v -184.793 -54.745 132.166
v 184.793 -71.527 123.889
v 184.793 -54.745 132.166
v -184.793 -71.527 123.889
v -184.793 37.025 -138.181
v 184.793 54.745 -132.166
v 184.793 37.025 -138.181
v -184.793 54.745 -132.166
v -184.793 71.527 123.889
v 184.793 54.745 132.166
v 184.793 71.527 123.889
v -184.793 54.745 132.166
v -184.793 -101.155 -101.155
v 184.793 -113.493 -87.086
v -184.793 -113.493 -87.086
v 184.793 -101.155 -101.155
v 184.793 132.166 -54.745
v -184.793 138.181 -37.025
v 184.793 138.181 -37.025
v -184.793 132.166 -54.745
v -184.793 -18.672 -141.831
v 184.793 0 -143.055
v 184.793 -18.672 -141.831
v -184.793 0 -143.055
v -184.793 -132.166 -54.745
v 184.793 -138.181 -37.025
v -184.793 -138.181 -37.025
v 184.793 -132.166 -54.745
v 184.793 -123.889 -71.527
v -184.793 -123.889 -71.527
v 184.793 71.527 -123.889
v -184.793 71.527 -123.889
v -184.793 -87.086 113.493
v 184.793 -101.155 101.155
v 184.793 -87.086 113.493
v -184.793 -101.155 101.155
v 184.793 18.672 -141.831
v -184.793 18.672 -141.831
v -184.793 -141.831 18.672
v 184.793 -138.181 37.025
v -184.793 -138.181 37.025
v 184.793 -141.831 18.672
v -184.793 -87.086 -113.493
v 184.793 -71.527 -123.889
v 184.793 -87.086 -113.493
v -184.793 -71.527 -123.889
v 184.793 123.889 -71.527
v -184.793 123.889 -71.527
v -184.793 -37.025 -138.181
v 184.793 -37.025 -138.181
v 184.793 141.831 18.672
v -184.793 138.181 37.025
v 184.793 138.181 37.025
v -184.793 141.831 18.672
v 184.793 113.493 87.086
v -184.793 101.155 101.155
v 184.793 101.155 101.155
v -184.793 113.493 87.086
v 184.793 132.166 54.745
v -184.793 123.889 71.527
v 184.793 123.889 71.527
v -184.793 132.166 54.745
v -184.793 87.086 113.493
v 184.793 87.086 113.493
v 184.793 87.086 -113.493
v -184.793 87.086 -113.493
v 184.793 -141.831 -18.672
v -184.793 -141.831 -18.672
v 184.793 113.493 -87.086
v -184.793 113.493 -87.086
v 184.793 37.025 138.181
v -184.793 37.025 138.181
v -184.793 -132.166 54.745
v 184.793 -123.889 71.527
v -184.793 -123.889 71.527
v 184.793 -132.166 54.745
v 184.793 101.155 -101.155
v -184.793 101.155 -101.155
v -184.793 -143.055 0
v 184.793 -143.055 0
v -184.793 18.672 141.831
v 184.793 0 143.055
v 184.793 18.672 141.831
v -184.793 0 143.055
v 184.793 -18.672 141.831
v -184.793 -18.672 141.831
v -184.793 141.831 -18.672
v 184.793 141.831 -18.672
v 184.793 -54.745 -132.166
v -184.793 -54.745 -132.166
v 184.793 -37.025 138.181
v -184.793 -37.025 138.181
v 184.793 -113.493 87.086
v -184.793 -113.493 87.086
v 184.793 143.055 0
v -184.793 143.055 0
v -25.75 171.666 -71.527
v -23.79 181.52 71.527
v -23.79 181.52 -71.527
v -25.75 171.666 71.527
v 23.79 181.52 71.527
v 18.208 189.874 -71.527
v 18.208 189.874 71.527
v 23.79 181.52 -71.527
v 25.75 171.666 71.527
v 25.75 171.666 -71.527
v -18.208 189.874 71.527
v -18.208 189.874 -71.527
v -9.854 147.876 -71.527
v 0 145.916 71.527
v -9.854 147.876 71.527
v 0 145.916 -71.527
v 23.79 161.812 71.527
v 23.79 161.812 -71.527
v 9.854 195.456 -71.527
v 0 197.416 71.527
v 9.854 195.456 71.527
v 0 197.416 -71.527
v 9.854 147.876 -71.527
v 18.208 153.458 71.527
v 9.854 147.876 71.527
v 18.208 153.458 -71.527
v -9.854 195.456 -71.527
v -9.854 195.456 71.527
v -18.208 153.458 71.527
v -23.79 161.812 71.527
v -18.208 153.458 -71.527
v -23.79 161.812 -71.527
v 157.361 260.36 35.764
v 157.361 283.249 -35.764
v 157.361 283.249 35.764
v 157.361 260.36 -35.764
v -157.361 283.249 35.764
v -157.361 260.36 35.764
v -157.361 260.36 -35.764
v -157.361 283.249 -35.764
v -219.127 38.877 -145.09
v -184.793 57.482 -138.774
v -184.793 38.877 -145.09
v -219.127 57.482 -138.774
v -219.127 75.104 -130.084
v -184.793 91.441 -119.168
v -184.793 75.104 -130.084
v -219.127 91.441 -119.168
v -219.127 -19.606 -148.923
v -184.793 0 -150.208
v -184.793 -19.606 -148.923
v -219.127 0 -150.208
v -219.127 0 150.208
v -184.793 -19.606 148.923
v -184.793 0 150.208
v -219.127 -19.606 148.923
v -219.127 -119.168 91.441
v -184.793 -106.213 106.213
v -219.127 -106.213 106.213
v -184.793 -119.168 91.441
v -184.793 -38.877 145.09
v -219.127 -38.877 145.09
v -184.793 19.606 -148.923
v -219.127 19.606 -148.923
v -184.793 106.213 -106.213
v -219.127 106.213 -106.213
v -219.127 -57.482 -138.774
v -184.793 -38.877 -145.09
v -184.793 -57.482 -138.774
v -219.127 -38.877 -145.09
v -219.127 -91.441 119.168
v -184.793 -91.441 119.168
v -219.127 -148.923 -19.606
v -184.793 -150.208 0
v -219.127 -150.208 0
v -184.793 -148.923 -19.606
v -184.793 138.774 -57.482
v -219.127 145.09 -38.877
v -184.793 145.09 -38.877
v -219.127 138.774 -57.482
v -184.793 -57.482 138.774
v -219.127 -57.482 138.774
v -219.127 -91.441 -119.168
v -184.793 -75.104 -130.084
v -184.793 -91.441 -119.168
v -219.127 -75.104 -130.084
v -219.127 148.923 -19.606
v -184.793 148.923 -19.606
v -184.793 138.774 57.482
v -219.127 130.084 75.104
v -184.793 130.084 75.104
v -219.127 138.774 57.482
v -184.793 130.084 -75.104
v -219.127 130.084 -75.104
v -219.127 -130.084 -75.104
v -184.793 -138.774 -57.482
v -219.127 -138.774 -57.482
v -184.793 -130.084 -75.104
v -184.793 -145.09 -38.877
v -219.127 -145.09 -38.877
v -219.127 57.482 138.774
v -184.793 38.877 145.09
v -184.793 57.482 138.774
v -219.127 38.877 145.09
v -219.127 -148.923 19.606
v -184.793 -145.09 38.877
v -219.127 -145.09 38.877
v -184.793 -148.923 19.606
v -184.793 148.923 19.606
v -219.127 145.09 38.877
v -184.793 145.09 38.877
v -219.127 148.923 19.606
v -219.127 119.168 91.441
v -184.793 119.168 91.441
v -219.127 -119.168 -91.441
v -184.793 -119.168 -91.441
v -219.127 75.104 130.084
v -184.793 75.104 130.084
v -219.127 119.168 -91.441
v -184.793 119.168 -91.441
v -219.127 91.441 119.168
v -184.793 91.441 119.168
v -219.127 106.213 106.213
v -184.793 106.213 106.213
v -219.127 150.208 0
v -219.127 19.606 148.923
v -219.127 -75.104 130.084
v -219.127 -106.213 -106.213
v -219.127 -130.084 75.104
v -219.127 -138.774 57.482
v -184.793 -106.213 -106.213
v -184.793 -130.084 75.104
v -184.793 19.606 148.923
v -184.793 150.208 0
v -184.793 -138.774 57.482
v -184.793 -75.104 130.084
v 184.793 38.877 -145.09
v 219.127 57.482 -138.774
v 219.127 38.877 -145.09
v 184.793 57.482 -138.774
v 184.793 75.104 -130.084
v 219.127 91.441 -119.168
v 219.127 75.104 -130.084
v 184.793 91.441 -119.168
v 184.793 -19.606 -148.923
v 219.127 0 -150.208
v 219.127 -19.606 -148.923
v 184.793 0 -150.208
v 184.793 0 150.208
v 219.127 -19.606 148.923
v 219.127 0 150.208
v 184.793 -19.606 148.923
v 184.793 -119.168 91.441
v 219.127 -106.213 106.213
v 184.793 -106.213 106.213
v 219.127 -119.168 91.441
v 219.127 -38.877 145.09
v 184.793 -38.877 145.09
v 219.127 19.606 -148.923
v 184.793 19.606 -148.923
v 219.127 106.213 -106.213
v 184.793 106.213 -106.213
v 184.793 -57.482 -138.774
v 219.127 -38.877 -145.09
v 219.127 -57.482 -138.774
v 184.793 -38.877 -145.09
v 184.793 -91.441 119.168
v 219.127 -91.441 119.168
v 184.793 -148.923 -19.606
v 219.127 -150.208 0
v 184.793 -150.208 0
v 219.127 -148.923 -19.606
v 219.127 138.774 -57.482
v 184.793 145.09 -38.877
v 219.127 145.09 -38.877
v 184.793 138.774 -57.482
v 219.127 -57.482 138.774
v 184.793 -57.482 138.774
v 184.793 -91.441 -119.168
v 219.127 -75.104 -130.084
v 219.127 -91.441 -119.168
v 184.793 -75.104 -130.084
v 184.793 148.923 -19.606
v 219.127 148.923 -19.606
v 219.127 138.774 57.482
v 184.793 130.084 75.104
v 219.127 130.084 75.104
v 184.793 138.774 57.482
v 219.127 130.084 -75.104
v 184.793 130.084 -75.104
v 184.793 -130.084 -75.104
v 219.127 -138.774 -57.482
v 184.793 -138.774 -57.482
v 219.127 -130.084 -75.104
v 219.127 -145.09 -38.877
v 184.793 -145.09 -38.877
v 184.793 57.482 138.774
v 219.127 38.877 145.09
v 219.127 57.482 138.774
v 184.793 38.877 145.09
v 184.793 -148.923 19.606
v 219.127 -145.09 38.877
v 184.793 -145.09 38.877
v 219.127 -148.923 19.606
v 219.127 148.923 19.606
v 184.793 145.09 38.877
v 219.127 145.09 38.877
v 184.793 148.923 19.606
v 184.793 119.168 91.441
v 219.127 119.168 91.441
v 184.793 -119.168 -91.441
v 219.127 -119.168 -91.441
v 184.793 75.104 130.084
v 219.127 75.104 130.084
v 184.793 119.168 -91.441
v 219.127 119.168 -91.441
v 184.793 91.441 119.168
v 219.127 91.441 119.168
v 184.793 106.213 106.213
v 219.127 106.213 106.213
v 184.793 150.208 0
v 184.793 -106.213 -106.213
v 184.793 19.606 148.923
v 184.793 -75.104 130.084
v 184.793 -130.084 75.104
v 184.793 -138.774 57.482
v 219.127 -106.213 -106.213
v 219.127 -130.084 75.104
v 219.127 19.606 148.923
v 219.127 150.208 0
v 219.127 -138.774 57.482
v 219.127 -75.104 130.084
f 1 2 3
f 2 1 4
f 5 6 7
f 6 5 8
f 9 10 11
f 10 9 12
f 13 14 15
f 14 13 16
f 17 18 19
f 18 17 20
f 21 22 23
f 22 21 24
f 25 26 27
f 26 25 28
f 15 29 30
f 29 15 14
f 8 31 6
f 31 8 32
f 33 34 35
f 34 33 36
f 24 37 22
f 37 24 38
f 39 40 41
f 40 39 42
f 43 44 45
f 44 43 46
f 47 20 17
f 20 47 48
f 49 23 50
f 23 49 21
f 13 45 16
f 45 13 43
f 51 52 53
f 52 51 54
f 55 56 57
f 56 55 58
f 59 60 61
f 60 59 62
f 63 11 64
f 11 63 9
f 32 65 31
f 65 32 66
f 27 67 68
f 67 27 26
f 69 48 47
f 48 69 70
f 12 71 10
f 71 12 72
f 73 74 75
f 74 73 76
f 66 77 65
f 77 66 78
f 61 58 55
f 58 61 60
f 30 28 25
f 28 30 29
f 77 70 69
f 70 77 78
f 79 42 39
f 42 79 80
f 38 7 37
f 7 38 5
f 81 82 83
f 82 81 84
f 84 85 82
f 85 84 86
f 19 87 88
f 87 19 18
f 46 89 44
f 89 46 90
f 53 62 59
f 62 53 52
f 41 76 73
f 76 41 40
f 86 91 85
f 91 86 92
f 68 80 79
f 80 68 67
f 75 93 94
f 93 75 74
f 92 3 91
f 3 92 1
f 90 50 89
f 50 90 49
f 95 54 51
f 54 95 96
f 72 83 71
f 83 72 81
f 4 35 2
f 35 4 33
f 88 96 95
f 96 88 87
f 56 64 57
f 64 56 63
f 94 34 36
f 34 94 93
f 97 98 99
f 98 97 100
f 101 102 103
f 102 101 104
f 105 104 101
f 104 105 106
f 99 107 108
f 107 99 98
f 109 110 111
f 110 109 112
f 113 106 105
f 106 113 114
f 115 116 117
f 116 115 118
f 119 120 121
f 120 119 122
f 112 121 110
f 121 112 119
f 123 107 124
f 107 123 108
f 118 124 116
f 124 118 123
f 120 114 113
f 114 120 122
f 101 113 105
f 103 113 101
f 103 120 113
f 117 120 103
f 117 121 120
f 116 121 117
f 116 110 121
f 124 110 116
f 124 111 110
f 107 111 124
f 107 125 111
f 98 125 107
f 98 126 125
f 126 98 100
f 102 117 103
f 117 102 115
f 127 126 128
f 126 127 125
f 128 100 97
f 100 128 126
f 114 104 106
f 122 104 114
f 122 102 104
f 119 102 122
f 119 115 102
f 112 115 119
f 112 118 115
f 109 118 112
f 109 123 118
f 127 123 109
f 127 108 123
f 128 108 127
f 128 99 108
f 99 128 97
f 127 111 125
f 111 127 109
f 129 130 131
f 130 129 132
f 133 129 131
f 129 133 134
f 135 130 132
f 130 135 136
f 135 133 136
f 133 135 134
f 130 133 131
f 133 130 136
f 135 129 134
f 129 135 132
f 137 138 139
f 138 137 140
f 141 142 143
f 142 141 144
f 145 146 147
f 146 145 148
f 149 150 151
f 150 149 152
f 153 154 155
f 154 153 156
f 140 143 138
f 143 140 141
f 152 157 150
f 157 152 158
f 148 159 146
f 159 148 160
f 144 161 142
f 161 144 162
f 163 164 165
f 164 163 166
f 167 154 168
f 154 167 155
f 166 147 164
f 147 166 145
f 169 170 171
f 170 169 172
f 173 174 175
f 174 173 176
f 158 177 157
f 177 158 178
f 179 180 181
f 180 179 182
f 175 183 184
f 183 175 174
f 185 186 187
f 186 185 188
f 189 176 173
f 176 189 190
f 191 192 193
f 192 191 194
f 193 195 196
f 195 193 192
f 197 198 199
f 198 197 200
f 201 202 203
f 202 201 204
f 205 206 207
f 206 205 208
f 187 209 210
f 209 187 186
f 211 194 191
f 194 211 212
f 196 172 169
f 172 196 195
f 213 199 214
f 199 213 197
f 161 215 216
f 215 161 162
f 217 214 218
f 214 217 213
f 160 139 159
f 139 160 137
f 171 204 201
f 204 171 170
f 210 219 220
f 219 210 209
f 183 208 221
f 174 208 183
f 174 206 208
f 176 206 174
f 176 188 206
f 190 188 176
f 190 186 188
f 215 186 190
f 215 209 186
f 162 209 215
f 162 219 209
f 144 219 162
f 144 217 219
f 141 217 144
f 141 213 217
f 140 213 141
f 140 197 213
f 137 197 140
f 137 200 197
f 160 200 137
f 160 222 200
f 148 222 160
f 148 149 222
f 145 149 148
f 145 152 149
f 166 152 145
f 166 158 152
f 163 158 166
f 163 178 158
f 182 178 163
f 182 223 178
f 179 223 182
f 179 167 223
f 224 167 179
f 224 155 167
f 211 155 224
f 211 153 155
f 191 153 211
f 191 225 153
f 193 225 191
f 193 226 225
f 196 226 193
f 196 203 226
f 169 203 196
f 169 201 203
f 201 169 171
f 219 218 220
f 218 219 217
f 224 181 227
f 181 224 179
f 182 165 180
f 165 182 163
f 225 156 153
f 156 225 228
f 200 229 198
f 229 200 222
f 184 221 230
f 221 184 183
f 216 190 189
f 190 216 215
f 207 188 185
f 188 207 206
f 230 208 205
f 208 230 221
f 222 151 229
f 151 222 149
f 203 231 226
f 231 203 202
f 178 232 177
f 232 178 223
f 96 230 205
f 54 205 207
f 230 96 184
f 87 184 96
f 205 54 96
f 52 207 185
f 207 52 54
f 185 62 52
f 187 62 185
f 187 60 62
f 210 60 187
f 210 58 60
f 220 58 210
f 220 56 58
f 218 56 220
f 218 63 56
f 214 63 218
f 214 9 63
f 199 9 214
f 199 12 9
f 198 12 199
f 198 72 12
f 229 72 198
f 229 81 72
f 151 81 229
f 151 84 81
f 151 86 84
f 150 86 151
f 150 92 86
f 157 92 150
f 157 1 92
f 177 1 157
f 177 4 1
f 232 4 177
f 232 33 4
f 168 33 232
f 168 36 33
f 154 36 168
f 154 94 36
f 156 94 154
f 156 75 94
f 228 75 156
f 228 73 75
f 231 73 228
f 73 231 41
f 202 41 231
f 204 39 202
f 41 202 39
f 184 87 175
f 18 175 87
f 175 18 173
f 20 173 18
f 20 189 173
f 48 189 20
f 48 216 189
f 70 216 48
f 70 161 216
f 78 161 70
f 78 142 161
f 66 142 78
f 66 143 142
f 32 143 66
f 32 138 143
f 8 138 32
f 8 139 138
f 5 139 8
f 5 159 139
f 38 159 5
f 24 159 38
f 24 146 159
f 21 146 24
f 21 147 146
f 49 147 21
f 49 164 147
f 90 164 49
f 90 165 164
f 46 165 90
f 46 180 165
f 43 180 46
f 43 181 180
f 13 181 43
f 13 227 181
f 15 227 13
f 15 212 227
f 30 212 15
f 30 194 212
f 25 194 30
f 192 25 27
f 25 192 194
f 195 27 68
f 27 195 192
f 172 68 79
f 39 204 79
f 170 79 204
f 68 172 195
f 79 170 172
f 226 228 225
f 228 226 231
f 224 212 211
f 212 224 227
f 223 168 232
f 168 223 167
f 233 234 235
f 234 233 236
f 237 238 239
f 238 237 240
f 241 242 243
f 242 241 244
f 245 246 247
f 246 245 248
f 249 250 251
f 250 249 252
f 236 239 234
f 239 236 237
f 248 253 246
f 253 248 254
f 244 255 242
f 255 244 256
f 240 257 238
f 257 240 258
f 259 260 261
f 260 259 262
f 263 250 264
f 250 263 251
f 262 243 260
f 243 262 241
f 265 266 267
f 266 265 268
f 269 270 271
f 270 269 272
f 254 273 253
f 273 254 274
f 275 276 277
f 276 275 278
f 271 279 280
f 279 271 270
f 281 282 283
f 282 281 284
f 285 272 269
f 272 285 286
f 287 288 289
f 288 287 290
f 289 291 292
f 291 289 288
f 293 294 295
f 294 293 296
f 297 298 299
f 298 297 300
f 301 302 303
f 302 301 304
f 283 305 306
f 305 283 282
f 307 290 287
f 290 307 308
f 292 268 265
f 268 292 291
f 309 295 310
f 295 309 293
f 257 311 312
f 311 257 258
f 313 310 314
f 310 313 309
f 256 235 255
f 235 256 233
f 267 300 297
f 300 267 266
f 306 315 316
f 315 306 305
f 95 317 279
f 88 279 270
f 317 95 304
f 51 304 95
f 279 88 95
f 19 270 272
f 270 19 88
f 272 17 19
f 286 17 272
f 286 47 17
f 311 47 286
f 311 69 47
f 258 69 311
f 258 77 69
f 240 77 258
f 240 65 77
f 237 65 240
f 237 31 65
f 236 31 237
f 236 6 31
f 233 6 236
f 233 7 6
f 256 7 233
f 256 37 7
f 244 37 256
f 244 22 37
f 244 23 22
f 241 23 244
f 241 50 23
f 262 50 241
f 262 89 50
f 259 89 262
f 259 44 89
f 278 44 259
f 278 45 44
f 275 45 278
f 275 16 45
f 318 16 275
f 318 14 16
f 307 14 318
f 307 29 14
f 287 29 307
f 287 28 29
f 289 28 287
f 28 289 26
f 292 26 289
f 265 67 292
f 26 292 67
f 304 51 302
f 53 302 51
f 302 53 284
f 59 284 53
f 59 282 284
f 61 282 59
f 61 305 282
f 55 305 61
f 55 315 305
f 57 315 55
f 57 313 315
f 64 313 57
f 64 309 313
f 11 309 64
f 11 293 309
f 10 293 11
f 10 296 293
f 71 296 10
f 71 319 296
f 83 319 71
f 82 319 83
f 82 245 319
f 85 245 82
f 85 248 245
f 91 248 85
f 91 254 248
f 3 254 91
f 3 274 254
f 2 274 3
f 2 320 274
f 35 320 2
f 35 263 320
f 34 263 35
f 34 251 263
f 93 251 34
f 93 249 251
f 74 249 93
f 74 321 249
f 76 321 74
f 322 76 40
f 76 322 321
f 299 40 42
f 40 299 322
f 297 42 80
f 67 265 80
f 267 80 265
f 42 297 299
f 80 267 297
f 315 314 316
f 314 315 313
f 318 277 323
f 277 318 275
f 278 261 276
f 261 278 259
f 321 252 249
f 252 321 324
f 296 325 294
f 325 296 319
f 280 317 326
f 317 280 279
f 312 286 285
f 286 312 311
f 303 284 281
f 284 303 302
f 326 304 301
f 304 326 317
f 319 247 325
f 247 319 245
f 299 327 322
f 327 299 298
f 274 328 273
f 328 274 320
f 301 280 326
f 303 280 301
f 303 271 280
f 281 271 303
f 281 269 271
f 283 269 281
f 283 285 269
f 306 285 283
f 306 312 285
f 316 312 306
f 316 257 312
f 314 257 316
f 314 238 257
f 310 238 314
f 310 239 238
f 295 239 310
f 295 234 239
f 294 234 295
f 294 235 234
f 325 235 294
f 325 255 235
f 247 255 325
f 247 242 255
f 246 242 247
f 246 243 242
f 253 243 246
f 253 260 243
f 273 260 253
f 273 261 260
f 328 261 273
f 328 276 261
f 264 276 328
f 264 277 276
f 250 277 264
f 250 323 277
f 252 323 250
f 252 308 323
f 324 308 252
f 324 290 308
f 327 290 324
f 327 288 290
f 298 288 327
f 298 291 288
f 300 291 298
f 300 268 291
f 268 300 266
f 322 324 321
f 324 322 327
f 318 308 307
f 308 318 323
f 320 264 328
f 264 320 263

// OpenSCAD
// Auto-generated by scripts/author_from_manifest.py (Phase D.3).
// Source: data/phase_d_manifest.json (sku_intent='tyco-av1-300-alarm-check-6in').
// Do not hand-edit — regenerate from the manifest.
//
// @part tyco_av1_300_alarm_check_6in
// @kind valve
// @category valve.alarm.check
// @display-name "Tyco AV-1-300 Alarm Check Valve 6\" (300 psi)"
// @mfg tyco_fire_protection
// @mfg-pn AV-1-300
// @listing UL FM
// @price-usd 620.00
// @install-minutes 45
// @crew foreman
// @param size_in number default=6 label="Size" unit="in"
// @port inlet position=[-0.05,0,0] direction=[-1,0,0] style=grooved size_in=6 role=run_a
// @port outlet position=[0.05,0,0] direction=[1,0,0] style=grooved size_in=6 role=run_b

size_in = 6.0;

function od_mm(nps) =
    nps ==   1  ? 33.4 :
    nps == 1.25 ? 42.2 :
    nps == 1.5  ? 48.3 :
    nps ==   2  ? 60.3 :
    nps == 2.5  ? 73.0 :
    nps ==   3  ? 88.9 :
    nps ==   4  ? 114.3 :
    nps ==   6  ? 168.3 :
    nps ==   8  ? 219.1 : 73.0;

od = od_mm(size_in);
body_len = od * 2.4;
body_d   = od * 1.7;

union() {
    // Valve body
    rotate([0, 90, 0])
        cylinder(h = body_len, d = body_d, center = true, $fn = 48);
    // Stem / handle indicator
    translate([0, body_d * 0.6, 0])
        cylinder(h = body_d * 0.5, d = body_d * 0.18, center = true, $fn = 16);
    translate([0, body_d * 0.95, 0])
        cube([body_d * 1.1, body_d * 0.08, body_d * 0.25], center = true);
    // End flanges
    translate([-body_len/2, 0, 0])
        rotate([0, 90, 0])
        cylinder(h = body_d * 0.12, d = body_d * 1.05, center = true, $fn = 48);
    translate([ body_len/2, 0, 0])
        rotate([0, 90, 0])
        cylinder(h = body_d * 0.12, d = body_d * 1.05, center = true, $fn = 48);
}
